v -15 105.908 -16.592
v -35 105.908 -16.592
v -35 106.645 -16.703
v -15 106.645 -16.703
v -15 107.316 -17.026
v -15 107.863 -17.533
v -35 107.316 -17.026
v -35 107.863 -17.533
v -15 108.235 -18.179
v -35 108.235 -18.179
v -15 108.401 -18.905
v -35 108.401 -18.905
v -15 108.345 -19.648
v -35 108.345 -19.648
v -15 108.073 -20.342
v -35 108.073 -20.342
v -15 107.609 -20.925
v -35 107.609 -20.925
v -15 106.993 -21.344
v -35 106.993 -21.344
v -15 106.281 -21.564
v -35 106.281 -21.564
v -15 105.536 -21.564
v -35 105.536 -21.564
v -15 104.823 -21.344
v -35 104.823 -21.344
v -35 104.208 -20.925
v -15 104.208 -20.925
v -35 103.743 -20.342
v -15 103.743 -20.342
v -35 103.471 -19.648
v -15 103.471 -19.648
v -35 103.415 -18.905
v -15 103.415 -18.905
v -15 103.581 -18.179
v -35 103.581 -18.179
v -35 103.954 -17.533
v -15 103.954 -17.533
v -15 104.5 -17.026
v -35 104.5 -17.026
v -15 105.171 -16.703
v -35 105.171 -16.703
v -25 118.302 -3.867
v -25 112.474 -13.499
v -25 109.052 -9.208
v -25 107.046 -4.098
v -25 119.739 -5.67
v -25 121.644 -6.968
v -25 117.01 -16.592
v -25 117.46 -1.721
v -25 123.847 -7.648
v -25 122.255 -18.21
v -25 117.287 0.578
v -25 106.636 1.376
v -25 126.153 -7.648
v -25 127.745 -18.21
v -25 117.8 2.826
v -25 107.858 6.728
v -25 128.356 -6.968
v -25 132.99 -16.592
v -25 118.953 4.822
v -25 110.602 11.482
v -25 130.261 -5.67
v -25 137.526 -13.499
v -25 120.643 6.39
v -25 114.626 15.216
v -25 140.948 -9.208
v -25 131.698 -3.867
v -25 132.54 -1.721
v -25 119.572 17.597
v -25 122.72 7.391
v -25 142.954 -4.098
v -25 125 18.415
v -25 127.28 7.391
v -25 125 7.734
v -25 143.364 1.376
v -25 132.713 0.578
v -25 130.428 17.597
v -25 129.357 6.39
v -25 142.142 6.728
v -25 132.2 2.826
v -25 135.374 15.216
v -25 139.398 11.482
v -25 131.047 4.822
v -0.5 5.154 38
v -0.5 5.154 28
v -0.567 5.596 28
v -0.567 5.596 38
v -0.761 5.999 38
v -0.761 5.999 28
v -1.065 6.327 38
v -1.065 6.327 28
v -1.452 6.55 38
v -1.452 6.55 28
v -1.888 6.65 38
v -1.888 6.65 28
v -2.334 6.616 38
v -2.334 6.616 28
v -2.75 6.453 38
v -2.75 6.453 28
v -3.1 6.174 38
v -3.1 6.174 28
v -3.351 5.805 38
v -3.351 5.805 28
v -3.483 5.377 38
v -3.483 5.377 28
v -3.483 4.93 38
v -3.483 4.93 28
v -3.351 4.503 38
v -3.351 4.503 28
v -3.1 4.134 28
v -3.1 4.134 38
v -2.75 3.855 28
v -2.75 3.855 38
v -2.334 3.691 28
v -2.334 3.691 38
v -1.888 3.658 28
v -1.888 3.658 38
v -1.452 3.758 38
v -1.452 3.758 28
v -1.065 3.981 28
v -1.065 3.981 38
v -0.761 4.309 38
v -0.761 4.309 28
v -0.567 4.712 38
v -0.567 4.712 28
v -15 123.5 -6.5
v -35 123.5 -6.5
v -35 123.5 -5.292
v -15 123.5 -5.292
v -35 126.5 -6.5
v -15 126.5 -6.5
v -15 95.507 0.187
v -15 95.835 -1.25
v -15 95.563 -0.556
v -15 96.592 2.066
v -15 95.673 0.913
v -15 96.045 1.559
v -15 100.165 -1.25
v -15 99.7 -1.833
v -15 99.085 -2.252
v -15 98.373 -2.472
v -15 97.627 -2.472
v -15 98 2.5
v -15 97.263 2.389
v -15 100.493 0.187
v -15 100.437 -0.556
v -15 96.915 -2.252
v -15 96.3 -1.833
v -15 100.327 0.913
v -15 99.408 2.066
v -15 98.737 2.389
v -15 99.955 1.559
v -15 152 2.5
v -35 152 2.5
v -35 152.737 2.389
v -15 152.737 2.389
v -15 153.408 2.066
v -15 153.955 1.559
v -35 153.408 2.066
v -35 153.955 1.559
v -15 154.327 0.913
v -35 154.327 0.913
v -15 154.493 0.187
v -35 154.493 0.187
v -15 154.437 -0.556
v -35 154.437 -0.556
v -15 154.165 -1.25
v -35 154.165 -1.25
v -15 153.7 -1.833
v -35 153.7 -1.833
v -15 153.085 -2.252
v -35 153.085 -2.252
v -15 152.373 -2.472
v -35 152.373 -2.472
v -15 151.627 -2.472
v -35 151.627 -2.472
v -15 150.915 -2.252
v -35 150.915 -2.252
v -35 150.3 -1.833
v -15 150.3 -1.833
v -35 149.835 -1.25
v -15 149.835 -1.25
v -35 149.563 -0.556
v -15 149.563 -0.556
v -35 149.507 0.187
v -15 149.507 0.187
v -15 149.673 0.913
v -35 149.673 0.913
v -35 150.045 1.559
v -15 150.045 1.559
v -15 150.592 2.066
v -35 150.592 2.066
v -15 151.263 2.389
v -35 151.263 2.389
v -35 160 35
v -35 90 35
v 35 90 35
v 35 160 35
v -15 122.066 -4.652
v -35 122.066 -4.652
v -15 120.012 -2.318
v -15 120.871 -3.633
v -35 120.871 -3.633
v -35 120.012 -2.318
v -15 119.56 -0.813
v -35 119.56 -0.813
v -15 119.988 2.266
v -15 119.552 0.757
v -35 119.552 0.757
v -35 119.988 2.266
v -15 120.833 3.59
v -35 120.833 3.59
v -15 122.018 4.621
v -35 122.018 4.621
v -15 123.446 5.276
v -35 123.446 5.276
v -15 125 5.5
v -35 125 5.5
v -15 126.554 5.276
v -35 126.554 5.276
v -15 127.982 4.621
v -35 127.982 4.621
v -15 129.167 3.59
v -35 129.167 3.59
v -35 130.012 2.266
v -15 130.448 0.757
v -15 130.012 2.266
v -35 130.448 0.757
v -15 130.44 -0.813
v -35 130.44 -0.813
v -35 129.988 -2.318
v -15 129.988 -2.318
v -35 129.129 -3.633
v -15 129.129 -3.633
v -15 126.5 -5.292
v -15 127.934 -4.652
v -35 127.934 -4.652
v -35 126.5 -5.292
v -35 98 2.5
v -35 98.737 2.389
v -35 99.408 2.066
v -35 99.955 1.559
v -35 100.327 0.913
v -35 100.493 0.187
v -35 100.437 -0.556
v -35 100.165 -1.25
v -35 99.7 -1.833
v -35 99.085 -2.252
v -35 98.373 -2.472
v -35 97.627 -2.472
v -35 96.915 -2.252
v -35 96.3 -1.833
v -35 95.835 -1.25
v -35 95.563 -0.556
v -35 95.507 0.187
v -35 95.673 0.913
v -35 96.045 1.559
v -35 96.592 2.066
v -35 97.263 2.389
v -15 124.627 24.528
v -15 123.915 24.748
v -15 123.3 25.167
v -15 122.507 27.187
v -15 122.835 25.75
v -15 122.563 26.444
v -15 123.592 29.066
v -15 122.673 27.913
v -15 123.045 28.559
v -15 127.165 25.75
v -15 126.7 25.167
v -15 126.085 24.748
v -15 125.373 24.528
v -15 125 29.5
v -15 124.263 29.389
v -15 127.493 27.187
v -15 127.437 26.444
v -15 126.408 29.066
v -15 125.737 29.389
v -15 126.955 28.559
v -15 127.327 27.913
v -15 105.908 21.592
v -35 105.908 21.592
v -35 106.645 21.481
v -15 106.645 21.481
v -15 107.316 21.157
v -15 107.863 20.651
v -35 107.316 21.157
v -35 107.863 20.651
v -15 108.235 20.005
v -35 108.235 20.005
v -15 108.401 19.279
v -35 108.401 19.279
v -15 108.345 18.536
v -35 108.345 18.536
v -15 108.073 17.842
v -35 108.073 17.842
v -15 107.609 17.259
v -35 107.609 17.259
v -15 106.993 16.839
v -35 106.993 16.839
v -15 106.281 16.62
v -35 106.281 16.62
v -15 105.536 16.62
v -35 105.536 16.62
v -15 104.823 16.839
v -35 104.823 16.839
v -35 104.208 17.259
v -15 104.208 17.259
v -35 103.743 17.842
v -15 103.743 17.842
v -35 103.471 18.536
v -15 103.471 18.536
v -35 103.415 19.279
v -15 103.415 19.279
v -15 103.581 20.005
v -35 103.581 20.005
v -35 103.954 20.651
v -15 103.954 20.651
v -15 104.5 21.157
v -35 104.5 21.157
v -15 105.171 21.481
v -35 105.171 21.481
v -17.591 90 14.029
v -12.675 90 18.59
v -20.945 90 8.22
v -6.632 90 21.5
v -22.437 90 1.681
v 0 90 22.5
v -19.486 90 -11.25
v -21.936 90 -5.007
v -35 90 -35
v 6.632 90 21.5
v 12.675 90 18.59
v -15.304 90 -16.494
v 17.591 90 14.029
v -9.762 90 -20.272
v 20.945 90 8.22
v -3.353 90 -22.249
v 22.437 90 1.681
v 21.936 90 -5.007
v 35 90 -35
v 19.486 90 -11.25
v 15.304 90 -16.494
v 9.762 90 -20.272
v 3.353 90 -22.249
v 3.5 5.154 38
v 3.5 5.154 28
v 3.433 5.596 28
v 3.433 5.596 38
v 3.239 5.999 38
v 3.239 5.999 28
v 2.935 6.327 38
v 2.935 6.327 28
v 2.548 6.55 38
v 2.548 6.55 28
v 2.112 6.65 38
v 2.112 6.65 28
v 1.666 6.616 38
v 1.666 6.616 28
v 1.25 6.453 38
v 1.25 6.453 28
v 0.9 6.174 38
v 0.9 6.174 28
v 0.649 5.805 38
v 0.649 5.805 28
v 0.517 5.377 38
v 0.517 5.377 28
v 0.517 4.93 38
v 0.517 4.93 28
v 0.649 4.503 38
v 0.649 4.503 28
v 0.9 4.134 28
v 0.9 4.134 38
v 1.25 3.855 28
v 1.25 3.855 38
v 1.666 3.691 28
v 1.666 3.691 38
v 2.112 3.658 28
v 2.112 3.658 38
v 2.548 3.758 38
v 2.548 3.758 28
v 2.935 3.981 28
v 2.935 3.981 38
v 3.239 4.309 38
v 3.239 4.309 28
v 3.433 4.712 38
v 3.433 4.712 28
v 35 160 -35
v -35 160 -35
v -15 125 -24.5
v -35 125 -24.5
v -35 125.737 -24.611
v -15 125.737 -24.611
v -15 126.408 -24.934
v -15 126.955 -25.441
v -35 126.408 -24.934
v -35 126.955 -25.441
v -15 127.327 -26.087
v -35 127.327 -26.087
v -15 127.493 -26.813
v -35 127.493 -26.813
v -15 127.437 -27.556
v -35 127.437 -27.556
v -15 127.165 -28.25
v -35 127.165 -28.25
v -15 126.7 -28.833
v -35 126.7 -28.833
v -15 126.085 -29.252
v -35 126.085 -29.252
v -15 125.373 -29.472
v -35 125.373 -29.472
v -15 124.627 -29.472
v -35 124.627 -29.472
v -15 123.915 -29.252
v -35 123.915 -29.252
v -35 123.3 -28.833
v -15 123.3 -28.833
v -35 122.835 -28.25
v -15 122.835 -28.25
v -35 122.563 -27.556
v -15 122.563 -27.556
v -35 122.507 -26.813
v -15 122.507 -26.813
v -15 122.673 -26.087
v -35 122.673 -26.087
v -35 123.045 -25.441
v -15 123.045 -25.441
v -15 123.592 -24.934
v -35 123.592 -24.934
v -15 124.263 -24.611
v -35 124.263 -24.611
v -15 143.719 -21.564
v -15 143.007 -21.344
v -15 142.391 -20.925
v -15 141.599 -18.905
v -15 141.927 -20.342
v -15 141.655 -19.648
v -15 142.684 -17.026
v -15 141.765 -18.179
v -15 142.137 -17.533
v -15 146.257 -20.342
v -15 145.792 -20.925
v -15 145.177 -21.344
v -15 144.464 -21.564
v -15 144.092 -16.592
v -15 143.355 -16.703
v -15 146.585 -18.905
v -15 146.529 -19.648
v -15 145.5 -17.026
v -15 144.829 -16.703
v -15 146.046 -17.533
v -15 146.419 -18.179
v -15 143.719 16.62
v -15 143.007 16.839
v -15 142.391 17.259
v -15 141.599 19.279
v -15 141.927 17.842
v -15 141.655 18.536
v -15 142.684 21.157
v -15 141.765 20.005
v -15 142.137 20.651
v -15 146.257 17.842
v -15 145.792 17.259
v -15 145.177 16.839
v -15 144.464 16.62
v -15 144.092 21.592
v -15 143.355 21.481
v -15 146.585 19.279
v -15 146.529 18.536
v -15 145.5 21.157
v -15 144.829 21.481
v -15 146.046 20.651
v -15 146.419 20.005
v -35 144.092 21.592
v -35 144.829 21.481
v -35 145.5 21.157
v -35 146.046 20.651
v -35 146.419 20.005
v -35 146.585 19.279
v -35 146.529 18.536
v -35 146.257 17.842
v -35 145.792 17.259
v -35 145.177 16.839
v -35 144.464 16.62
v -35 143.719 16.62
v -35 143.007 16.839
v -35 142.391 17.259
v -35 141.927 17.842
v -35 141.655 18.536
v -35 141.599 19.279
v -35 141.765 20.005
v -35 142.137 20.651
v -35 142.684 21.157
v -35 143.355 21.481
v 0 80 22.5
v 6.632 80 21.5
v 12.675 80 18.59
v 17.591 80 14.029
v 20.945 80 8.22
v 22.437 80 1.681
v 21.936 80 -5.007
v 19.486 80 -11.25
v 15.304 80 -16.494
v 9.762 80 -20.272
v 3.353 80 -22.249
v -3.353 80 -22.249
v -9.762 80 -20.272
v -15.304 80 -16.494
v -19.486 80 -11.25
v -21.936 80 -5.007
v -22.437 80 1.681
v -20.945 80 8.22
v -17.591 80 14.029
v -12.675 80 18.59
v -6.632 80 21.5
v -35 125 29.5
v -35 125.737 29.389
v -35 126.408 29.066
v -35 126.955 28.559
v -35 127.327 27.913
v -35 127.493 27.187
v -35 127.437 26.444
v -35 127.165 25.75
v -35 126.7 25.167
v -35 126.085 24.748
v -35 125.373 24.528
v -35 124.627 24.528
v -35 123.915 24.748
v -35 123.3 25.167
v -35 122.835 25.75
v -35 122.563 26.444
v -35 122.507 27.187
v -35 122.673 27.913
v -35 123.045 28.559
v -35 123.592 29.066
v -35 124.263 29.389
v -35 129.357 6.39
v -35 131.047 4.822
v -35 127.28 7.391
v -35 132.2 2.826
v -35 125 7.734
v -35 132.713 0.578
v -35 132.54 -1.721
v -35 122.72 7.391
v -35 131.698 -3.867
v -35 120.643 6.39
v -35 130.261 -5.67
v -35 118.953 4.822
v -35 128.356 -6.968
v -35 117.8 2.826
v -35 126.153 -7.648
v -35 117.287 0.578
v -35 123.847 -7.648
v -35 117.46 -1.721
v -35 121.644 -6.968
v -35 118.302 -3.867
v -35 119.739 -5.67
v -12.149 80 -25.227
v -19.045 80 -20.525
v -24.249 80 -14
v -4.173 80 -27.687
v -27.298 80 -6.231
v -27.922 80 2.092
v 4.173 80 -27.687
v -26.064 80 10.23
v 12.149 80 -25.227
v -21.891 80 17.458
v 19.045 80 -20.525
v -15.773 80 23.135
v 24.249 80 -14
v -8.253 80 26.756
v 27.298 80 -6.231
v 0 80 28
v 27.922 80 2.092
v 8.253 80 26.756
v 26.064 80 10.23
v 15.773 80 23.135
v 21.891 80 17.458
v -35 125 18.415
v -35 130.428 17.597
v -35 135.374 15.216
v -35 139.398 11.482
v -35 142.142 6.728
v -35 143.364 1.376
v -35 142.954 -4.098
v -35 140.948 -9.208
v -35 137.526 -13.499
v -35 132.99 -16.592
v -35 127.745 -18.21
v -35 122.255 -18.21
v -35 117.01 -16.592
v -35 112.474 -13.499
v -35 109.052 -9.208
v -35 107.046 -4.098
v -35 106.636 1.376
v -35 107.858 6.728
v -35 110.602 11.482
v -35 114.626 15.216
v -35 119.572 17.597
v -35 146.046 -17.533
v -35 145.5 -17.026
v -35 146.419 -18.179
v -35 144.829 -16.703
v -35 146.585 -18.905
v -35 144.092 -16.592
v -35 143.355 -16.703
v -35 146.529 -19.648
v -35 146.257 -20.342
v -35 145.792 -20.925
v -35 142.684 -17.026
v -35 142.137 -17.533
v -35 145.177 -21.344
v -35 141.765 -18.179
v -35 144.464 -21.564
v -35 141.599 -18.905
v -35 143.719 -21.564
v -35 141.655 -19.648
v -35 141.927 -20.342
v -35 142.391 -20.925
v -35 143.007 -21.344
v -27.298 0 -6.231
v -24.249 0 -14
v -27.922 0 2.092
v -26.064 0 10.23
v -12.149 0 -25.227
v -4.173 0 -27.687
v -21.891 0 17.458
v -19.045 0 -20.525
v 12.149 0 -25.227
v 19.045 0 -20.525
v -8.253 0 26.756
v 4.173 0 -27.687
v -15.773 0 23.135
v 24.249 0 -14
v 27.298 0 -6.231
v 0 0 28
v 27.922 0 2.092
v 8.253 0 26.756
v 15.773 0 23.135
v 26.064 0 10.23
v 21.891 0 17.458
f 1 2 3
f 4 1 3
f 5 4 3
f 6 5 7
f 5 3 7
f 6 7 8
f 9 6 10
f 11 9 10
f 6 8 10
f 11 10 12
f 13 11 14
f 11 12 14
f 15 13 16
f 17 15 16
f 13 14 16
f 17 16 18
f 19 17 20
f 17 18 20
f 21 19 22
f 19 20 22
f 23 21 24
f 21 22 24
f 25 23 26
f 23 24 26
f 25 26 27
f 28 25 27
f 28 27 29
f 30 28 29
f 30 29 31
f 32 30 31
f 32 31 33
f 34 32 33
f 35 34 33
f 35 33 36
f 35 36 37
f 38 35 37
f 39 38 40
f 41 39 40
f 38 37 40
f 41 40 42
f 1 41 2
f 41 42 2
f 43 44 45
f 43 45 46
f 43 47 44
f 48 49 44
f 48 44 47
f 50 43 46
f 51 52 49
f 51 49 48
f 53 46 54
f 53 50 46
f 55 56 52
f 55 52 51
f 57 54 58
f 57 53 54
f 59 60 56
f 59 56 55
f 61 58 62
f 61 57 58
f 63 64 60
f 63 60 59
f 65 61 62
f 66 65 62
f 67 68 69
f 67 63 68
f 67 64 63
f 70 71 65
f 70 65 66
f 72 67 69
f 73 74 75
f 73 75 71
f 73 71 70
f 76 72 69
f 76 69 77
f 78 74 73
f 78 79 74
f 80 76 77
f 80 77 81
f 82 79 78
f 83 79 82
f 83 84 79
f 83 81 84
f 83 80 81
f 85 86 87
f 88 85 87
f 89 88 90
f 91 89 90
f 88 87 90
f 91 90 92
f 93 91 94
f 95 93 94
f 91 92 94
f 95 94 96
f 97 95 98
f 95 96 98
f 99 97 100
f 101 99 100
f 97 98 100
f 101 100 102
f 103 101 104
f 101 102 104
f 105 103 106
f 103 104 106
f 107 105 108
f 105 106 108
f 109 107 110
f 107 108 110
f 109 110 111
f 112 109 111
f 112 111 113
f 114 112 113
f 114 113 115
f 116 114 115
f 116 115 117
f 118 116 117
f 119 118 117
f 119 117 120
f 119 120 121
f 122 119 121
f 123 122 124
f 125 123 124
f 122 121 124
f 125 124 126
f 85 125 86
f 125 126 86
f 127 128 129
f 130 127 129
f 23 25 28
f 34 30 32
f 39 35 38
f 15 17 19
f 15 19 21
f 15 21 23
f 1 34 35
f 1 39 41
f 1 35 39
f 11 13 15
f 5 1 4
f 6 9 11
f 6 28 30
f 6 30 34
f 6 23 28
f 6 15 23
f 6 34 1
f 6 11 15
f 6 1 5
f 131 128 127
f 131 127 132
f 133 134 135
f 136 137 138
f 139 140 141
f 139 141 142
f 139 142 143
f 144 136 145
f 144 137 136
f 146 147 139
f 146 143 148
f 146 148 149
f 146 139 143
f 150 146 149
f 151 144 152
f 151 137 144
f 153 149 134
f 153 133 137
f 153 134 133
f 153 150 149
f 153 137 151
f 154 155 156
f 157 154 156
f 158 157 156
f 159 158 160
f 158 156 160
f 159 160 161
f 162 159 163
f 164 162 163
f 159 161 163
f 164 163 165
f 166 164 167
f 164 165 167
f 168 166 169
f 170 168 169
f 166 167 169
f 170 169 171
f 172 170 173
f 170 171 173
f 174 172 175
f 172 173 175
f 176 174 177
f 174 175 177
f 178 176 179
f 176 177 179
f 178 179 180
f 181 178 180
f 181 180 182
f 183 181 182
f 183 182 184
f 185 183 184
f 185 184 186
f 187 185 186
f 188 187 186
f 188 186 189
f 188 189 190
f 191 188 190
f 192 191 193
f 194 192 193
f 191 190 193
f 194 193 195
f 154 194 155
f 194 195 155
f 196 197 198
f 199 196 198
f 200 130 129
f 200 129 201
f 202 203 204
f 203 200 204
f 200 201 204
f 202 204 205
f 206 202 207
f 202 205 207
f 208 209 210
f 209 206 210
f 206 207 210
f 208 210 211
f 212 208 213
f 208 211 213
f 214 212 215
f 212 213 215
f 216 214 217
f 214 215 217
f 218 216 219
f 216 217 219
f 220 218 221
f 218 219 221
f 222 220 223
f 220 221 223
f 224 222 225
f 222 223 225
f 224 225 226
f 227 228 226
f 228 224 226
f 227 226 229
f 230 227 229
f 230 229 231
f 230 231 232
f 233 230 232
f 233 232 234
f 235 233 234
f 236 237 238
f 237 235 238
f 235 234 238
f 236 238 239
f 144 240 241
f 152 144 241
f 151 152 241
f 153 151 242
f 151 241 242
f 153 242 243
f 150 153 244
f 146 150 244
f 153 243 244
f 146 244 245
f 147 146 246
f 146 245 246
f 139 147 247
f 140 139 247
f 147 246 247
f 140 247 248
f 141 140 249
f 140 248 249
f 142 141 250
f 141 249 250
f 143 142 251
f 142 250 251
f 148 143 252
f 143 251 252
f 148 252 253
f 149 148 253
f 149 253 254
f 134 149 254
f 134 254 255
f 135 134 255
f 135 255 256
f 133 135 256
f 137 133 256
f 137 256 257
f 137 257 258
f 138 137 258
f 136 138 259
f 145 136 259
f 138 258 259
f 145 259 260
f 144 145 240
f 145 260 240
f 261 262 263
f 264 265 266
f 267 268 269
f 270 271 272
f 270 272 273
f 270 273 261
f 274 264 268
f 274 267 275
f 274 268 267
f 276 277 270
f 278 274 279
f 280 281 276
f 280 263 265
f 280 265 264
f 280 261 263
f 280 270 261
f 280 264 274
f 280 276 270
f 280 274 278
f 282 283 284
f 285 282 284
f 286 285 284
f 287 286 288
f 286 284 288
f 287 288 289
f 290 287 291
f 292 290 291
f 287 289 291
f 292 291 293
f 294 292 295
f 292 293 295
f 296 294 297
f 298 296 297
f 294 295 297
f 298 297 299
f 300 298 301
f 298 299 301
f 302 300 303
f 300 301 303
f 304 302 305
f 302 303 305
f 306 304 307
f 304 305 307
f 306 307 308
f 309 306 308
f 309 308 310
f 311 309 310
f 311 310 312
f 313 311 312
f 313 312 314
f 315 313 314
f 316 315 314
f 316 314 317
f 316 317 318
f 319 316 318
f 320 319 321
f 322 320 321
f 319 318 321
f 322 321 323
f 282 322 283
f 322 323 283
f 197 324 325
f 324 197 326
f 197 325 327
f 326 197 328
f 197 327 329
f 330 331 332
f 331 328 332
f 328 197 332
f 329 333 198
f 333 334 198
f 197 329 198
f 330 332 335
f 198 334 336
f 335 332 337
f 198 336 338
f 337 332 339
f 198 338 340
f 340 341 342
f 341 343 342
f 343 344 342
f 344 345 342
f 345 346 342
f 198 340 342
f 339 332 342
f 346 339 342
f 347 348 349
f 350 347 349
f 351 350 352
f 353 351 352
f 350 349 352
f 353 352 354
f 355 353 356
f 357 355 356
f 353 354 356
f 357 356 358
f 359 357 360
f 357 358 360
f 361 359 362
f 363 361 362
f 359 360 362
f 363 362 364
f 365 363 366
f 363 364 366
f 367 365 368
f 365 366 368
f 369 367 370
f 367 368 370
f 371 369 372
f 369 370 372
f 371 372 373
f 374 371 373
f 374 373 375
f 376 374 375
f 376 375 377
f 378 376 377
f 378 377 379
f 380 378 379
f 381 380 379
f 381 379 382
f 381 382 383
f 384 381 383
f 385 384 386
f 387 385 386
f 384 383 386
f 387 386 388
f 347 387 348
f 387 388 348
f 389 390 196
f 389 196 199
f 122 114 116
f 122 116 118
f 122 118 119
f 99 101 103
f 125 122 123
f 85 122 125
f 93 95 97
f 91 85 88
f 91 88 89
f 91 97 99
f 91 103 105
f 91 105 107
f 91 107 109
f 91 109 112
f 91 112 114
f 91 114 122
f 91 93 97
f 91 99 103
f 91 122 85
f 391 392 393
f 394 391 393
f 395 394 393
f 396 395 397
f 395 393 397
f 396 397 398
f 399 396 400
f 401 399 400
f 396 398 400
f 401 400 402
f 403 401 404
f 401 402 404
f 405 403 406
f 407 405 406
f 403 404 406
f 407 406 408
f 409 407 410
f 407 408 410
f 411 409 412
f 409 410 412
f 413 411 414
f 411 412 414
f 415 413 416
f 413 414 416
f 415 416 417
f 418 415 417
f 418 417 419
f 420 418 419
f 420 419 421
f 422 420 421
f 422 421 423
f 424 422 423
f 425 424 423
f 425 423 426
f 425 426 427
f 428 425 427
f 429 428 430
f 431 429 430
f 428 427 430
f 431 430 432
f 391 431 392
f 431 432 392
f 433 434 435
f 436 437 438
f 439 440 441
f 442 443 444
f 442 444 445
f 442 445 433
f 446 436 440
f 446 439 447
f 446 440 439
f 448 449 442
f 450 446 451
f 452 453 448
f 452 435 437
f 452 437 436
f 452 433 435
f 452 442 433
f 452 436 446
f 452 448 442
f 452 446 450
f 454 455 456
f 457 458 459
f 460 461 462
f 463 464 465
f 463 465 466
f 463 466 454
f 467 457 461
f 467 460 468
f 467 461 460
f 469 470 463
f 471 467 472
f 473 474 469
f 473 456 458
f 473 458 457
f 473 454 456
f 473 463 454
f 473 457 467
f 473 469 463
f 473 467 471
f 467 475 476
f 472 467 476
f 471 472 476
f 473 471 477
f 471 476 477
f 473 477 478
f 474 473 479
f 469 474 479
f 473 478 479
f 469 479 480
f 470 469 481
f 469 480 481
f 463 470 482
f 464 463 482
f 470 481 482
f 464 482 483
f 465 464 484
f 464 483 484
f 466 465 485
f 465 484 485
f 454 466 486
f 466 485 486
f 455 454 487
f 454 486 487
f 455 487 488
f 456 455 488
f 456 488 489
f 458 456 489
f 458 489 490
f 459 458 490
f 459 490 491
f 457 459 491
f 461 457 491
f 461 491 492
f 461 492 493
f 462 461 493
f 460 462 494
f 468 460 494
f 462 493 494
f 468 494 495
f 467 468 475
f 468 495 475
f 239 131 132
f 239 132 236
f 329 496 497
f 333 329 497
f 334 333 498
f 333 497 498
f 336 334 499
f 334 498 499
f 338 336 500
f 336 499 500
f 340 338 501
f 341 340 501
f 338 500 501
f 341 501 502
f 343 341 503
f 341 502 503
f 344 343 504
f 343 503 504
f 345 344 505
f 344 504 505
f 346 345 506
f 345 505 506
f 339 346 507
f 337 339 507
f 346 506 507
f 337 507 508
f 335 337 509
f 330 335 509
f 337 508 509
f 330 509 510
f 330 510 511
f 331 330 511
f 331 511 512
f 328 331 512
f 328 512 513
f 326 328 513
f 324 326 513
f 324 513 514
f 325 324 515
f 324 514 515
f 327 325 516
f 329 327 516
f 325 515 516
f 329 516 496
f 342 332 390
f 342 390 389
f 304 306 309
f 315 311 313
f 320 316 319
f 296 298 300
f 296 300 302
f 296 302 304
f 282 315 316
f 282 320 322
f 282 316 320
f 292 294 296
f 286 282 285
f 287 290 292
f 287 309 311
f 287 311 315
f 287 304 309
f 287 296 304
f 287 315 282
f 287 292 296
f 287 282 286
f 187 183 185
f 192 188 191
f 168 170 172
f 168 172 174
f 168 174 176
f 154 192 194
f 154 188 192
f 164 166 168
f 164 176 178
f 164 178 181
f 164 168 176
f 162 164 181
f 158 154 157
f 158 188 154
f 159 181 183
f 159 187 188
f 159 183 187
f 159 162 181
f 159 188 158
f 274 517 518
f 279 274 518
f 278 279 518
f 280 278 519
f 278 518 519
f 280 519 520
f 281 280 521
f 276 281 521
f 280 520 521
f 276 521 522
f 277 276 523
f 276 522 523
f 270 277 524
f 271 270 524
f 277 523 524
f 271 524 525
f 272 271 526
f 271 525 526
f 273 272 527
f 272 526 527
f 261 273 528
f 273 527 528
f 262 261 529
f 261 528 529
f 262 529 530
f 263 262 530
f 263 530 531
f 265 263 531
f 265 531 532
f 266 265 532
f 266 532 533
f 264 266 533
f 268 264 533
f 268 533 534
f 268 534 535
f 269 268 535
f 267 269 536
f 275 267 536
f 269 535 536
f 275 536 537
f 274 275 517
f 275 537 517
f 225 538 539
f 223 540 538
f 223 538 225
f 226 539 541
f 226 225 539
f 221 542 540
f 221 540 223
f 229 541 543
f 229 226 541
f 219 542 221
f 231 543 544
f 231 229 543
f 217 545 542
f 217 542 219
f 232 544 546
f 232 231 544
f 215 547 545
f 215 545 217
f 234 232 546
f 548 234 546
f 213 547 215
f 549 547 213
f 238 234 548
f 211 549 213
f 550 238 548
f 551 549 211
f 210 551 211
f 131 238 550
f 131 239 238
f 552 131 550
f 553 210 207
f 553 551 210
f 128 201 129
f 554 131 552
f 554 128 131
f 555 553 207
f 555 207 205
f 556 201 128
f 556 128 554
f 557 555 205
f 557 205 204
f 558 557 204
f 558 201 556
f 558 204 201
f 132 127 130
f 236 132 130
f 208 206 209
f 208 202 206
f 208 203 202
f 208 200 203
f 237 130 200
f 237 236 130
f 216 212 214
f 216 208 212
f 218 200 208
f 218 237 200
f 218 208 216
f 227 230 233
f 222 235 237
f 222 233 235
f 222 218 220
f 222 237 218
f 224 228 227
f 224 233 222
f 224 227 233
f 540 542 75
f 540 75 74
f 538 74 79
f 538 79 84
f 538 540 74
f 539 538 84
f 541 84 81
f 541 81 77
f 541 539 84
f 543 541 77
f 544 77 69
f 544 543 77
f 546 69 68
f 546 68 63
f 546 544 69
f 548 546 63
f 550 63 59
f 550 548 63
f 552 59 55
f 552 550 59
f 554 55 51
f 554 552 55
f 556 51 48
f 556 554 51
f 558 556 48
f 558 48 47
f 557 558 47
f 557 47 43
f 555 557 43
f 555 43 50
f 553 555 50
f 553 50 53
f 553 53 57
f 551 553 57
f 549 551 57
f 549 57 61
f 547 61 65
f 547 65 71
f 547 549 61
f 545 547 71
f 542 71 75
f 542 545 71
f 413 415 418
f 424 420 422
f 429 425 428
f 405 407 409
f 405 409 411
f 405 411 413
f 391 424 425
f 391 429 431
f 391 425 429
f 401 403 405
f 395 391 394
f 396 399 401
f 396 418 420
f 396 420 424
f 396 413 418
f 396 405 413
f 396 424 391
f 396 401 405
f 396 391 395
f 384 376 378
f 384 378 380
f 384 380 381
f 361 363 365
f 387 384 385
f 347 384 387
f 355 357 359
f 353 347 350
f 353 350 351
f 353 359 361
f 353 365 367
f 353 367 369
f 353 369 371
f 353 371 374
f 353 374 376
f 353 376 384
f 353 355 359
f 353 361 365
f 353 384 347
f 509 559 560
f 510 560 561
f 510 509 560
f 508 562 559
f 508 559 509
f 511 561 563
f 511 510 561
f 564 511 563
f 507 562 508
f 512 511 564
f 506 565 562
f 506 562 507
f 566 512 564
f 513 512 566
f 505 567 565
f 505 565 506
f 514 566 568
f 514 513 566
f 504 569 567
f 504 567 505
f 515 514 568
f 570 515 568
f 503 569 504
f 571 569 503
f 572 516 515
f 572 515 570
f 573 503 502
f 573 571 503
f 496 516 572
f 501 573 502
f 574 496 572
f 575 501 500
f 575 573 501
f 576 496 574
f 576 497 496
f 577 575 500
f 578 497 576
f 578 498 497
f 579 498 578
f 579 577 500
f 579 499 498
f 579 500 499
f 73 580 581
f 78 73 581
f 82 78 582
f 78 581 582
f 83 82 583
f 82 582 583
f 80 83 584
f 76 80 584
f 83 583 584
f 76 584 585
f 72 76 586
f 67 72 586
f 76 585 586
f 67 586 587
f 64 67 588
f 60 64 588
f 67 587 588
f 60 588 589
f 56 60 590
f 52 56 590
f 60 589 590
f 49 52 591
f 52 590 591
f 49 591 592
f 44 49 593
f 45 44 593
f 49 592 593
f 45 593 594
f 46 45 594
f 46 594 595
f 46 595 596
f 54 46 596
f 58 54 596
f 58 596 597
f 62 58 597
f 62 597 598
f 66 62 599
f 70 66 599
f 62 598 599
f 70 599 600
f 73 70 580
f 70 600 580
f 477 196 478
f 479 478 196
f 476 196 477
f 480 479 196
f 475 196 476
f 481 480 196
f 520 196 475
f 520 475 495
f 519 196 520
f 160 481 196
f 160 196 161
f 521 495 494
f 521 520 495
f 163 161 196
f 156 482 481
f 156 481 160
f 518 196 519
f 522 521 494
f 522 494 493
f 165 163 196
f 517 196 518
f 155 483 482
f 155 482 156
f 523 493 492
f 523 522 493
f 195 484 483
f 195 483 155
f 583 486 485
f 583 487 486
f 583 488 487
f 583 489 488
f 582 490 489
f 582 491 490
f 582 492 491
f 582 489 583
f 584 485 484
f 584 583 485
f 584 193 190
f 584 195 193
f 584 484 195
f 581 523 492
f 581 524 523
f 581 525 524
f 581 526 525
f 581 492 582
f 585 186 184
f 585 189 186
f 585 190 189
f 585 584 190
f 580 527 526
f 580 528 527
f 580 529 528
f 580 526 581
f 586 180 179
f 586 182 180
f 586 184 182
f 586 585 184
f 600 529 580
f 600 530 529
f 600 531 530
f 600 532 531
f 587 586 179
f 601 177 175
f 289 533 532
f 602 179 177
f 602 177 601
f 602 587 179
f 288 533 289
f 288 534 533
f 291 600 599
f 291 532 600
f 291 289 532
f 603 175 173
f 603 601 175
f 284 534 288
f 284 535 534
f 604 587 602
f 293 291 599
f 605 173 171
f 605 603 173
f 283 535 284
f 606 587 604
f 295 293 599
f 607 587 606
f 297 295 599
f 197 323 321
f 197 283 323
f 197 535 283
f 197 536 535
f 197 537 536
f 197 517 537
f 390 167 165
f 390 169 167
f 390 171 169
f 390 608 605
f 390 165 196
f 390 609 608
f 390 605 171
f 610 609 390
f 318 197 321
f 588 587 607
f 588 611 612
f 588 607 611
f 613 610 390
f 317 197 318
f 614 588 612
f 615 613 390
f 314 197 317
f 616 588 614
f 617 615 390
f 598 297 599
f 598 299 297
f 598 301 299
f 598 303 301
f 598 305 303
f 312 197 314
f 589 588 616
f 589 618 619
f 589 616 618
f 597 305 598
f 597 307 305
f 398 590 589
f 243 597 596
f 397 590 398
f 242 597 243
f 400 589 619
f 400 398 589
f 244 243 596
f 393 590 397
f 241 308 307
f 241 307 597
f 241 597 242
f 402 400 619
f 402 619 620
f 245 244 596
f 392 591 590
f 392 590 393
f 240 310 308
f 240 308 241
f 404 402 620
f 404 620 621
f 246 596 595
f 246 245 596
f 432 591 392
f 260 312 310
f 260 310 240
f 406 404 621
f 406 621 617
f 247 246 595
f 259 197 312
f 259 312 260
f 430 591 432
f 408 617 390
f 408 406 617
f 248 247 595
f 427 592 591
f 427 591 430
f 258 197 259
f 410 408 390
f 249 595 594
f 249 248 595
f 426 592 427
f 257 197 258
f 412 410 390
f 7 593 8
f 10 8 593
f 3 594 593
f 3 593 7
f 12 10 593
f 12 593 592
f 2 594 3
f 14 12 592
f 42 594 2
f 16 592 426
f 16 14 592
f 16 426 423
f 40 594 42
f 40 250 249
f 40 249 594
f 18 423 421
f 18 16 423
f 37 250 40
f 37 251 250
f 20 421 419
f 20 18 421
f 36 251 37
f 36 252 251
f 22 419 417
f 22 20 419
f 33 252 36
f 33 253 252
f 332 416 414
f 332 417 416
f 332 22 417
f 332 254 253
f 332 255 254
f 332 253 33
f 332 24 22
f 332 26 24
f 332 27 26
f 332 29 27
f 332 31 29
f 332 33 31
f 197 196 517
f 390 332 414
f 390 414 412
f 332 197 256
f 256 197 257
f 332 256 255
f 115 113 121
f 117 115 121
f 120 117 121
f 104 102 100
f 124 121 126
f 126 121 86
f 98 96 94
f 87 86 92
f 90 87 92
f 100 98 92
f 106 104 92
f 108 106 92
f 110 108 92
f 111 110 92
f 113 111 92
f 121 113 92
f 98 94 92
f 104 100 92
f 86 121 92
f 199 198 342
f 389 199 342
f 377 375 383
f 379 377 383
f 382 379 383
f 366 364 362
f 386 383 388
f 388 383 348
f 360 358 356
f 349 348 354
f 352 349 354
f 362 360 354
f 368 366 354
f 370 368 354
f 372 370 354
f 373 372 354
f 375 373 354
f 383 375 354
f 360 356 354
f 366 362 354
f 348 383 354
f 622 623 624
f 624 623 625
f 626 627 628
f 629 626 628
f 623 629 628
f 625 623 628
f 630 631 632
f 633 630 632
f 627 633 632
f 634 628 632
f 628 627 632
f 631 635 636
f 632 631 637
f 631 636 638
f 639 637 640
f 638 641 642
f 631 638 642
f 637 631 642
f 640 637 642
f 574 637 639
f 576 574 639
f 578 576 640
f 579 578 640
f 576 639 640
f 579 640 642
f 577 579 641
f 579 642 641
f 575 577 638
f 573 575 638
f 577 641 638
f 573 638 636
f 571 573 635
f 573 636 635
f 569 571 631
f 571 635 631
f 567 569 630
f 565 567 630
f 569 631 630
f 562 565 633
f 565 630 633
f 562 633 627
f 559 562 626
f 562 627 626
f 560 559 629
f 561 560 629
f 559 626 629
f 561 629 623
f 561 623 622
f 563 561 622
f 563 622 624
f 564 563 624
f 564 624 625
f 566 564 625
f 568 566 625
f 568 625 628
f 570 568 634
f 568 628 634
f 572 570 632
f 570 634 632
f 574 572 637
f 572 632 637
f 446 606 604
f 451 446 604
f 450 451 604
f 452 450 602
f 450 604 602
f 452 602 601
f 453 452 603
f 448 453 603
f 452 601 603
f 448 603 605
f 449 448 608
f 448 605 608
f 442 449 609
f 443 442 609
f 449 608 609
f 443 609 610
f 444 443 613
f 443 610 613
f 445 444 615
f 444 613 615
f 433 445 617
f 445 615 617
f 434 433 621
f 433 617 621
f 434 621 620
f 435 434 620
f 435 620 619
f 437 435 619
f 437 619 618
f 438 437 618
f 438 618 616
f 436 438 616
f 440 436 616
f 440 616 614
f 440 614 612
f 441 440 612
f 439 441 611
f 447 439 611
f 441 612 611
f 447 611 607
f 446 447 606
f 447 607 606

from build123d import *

# Parameters (mm, degrees)
SKETCH1_R             = 28
BOSS_EXTRUDE1_DEPTH   = 80
SKETCH3_R             = 22.5
BOSS_EXTRUDE2_DEPTH   = 10
SKETCH4_W             = 70
SKETCH4_H             = 70
BOSS_EXTRUDE3_DEPTH   = 70
SKETCH5_R             = 5.5
SKETCH5_R_2           = 2.5
CUT_EXTRUDE1_DEPTH    = 20
SKETCH6_R             = 1.5
BOSS_EXTRUDE4_DEPTH   = 10
BOSS_EXTRUDE4_2_DEPTH = 10
SKETCH7_W             = 2
SKETCH7_H             = 3
CUT_EXTRUDE2_DEPTH    = 20
SKETCH8_R             = 18.415438001
SKETCH8_R_2           = 7.734274919
CUT_EXTRUDE4_DEPTH    = 10


with BuildPart() as part:
    # Sketch1 → Boss-Extrude1 (new body)
    with BuildSketch(Plane(origin=(0, 0, 0), x_dir=(1, 0, 0), z_dir=(0, 1, 0))):
        with Locations(Location((0, 0, 0), (0, 0, 270))):
            Circle(SKETCH1_R)
    extrude(amount=BOSS_EXTRUDE1_DEPTH)

    # Sketch3 → Boss-Extrude2 (add)
    with BuildSketch(Plane(origin=(0, 80, 0), x_dir=(1, 0, 0), z_dir=(0, 1, 0))):
        with Locations(Location((0, 0, 0), (0, 0, 270))):
            Circle(SKETCH3_R)
    extrude(amount=BOSS_EXTRUDE2_DEPTH)

    # Sketch4 → Boss-Extrude3 (add)
    with BuildSketch(Plane(origin=(0, 90, 0), x_dir=(1, 0, 0), z_dir=(0, 1, 0))):
        Rectangle(SKETCH4_W, SKETCH4_H)
    extrude(amount=BOSS_EXTRUDE3_DEPTH)

    # Sketch5 → Cut-Extrude1 (cut)
    with BuildSketch(Plane.ZY.offset(35)):
        with Locations((0, 125)):
            Circle(SKETCH5_R)
        with Locations((0, 152)):
            Circle(SKETCH5_R_2)
        with Locations((19.091883092, 144.091883092)):
            Circle(SKETCH5_R_2)
        with Locations((27, 125)):
            Circle(SKETCH5_R_2)
        with Locations((19.091883092, 105.908116908)):
            Circle(SKETCH5_R_2)
        with Locations((0, 98)):
            Circle(SKETCH5_R_2)
        with Locations((-19.091883092, 105.908116908)):
            Circle(SKETCH5_R_2)
        with Locations((-27, 125)):
            Circle(SKETCH5_R_2)
        with Locations((-19.091883092, 144.091883092)):
            Circle(SKETCH5_R_2)
    extrude(amount=-CUT_EXTRUDE1_DEPTH, mode=Mode.SUBTRACT)

    # Sketch7 → Cut-Extrude2 (cut)
    with BuildSketch(Plane.ZY.offset(35)):
        with Locations((-5.5, 125)):
            Rectangle(SKETCH7_W, SKETCH7_H)
    extrude(amount=-CUT_EXTRUDE2_DEPTH, mode=Mode.SUBTRACT)

    # Sketch8 → Cut-Extrude4 (cut)
    with BuildSketch(Plane.ZY.offset(35)):
        with Locations((0, 125)):
            Circle(SKETCH8_R)
        with Locations((0, 125)):
            Circle(SKETCH8_R_2, mode=Mode.SUBTRACT)
    extrude(amount=-CUT_EXTRUDE4_DEPTH, mode=Mode.SUBTRACT)


with BuildPart() as body_2:
    # Sketch6 → Boss-Extrude4 (new body)
    with BuildSketch(Plane.XY.offset(28)):
        with Locations((-2, 5.153889314)):
            Circle(SKETCH6_R)
    extrude(amount=BOSS_EXTRUDE4_DEPTH)


with BuildPart() as body_3:
    # Sketch6 → Boss-Extrude4 2 (new body)
    with BuildSketch(Plane.XY.offset(28)):
        with Locations((2, 5.153889314)):
            Circle(SKETCH6_R)
    extrude(amount=BOSS_EXTRUDE4_2_DEPTH)


solid = Compound([part.part, body_2.part, body_3.part])
